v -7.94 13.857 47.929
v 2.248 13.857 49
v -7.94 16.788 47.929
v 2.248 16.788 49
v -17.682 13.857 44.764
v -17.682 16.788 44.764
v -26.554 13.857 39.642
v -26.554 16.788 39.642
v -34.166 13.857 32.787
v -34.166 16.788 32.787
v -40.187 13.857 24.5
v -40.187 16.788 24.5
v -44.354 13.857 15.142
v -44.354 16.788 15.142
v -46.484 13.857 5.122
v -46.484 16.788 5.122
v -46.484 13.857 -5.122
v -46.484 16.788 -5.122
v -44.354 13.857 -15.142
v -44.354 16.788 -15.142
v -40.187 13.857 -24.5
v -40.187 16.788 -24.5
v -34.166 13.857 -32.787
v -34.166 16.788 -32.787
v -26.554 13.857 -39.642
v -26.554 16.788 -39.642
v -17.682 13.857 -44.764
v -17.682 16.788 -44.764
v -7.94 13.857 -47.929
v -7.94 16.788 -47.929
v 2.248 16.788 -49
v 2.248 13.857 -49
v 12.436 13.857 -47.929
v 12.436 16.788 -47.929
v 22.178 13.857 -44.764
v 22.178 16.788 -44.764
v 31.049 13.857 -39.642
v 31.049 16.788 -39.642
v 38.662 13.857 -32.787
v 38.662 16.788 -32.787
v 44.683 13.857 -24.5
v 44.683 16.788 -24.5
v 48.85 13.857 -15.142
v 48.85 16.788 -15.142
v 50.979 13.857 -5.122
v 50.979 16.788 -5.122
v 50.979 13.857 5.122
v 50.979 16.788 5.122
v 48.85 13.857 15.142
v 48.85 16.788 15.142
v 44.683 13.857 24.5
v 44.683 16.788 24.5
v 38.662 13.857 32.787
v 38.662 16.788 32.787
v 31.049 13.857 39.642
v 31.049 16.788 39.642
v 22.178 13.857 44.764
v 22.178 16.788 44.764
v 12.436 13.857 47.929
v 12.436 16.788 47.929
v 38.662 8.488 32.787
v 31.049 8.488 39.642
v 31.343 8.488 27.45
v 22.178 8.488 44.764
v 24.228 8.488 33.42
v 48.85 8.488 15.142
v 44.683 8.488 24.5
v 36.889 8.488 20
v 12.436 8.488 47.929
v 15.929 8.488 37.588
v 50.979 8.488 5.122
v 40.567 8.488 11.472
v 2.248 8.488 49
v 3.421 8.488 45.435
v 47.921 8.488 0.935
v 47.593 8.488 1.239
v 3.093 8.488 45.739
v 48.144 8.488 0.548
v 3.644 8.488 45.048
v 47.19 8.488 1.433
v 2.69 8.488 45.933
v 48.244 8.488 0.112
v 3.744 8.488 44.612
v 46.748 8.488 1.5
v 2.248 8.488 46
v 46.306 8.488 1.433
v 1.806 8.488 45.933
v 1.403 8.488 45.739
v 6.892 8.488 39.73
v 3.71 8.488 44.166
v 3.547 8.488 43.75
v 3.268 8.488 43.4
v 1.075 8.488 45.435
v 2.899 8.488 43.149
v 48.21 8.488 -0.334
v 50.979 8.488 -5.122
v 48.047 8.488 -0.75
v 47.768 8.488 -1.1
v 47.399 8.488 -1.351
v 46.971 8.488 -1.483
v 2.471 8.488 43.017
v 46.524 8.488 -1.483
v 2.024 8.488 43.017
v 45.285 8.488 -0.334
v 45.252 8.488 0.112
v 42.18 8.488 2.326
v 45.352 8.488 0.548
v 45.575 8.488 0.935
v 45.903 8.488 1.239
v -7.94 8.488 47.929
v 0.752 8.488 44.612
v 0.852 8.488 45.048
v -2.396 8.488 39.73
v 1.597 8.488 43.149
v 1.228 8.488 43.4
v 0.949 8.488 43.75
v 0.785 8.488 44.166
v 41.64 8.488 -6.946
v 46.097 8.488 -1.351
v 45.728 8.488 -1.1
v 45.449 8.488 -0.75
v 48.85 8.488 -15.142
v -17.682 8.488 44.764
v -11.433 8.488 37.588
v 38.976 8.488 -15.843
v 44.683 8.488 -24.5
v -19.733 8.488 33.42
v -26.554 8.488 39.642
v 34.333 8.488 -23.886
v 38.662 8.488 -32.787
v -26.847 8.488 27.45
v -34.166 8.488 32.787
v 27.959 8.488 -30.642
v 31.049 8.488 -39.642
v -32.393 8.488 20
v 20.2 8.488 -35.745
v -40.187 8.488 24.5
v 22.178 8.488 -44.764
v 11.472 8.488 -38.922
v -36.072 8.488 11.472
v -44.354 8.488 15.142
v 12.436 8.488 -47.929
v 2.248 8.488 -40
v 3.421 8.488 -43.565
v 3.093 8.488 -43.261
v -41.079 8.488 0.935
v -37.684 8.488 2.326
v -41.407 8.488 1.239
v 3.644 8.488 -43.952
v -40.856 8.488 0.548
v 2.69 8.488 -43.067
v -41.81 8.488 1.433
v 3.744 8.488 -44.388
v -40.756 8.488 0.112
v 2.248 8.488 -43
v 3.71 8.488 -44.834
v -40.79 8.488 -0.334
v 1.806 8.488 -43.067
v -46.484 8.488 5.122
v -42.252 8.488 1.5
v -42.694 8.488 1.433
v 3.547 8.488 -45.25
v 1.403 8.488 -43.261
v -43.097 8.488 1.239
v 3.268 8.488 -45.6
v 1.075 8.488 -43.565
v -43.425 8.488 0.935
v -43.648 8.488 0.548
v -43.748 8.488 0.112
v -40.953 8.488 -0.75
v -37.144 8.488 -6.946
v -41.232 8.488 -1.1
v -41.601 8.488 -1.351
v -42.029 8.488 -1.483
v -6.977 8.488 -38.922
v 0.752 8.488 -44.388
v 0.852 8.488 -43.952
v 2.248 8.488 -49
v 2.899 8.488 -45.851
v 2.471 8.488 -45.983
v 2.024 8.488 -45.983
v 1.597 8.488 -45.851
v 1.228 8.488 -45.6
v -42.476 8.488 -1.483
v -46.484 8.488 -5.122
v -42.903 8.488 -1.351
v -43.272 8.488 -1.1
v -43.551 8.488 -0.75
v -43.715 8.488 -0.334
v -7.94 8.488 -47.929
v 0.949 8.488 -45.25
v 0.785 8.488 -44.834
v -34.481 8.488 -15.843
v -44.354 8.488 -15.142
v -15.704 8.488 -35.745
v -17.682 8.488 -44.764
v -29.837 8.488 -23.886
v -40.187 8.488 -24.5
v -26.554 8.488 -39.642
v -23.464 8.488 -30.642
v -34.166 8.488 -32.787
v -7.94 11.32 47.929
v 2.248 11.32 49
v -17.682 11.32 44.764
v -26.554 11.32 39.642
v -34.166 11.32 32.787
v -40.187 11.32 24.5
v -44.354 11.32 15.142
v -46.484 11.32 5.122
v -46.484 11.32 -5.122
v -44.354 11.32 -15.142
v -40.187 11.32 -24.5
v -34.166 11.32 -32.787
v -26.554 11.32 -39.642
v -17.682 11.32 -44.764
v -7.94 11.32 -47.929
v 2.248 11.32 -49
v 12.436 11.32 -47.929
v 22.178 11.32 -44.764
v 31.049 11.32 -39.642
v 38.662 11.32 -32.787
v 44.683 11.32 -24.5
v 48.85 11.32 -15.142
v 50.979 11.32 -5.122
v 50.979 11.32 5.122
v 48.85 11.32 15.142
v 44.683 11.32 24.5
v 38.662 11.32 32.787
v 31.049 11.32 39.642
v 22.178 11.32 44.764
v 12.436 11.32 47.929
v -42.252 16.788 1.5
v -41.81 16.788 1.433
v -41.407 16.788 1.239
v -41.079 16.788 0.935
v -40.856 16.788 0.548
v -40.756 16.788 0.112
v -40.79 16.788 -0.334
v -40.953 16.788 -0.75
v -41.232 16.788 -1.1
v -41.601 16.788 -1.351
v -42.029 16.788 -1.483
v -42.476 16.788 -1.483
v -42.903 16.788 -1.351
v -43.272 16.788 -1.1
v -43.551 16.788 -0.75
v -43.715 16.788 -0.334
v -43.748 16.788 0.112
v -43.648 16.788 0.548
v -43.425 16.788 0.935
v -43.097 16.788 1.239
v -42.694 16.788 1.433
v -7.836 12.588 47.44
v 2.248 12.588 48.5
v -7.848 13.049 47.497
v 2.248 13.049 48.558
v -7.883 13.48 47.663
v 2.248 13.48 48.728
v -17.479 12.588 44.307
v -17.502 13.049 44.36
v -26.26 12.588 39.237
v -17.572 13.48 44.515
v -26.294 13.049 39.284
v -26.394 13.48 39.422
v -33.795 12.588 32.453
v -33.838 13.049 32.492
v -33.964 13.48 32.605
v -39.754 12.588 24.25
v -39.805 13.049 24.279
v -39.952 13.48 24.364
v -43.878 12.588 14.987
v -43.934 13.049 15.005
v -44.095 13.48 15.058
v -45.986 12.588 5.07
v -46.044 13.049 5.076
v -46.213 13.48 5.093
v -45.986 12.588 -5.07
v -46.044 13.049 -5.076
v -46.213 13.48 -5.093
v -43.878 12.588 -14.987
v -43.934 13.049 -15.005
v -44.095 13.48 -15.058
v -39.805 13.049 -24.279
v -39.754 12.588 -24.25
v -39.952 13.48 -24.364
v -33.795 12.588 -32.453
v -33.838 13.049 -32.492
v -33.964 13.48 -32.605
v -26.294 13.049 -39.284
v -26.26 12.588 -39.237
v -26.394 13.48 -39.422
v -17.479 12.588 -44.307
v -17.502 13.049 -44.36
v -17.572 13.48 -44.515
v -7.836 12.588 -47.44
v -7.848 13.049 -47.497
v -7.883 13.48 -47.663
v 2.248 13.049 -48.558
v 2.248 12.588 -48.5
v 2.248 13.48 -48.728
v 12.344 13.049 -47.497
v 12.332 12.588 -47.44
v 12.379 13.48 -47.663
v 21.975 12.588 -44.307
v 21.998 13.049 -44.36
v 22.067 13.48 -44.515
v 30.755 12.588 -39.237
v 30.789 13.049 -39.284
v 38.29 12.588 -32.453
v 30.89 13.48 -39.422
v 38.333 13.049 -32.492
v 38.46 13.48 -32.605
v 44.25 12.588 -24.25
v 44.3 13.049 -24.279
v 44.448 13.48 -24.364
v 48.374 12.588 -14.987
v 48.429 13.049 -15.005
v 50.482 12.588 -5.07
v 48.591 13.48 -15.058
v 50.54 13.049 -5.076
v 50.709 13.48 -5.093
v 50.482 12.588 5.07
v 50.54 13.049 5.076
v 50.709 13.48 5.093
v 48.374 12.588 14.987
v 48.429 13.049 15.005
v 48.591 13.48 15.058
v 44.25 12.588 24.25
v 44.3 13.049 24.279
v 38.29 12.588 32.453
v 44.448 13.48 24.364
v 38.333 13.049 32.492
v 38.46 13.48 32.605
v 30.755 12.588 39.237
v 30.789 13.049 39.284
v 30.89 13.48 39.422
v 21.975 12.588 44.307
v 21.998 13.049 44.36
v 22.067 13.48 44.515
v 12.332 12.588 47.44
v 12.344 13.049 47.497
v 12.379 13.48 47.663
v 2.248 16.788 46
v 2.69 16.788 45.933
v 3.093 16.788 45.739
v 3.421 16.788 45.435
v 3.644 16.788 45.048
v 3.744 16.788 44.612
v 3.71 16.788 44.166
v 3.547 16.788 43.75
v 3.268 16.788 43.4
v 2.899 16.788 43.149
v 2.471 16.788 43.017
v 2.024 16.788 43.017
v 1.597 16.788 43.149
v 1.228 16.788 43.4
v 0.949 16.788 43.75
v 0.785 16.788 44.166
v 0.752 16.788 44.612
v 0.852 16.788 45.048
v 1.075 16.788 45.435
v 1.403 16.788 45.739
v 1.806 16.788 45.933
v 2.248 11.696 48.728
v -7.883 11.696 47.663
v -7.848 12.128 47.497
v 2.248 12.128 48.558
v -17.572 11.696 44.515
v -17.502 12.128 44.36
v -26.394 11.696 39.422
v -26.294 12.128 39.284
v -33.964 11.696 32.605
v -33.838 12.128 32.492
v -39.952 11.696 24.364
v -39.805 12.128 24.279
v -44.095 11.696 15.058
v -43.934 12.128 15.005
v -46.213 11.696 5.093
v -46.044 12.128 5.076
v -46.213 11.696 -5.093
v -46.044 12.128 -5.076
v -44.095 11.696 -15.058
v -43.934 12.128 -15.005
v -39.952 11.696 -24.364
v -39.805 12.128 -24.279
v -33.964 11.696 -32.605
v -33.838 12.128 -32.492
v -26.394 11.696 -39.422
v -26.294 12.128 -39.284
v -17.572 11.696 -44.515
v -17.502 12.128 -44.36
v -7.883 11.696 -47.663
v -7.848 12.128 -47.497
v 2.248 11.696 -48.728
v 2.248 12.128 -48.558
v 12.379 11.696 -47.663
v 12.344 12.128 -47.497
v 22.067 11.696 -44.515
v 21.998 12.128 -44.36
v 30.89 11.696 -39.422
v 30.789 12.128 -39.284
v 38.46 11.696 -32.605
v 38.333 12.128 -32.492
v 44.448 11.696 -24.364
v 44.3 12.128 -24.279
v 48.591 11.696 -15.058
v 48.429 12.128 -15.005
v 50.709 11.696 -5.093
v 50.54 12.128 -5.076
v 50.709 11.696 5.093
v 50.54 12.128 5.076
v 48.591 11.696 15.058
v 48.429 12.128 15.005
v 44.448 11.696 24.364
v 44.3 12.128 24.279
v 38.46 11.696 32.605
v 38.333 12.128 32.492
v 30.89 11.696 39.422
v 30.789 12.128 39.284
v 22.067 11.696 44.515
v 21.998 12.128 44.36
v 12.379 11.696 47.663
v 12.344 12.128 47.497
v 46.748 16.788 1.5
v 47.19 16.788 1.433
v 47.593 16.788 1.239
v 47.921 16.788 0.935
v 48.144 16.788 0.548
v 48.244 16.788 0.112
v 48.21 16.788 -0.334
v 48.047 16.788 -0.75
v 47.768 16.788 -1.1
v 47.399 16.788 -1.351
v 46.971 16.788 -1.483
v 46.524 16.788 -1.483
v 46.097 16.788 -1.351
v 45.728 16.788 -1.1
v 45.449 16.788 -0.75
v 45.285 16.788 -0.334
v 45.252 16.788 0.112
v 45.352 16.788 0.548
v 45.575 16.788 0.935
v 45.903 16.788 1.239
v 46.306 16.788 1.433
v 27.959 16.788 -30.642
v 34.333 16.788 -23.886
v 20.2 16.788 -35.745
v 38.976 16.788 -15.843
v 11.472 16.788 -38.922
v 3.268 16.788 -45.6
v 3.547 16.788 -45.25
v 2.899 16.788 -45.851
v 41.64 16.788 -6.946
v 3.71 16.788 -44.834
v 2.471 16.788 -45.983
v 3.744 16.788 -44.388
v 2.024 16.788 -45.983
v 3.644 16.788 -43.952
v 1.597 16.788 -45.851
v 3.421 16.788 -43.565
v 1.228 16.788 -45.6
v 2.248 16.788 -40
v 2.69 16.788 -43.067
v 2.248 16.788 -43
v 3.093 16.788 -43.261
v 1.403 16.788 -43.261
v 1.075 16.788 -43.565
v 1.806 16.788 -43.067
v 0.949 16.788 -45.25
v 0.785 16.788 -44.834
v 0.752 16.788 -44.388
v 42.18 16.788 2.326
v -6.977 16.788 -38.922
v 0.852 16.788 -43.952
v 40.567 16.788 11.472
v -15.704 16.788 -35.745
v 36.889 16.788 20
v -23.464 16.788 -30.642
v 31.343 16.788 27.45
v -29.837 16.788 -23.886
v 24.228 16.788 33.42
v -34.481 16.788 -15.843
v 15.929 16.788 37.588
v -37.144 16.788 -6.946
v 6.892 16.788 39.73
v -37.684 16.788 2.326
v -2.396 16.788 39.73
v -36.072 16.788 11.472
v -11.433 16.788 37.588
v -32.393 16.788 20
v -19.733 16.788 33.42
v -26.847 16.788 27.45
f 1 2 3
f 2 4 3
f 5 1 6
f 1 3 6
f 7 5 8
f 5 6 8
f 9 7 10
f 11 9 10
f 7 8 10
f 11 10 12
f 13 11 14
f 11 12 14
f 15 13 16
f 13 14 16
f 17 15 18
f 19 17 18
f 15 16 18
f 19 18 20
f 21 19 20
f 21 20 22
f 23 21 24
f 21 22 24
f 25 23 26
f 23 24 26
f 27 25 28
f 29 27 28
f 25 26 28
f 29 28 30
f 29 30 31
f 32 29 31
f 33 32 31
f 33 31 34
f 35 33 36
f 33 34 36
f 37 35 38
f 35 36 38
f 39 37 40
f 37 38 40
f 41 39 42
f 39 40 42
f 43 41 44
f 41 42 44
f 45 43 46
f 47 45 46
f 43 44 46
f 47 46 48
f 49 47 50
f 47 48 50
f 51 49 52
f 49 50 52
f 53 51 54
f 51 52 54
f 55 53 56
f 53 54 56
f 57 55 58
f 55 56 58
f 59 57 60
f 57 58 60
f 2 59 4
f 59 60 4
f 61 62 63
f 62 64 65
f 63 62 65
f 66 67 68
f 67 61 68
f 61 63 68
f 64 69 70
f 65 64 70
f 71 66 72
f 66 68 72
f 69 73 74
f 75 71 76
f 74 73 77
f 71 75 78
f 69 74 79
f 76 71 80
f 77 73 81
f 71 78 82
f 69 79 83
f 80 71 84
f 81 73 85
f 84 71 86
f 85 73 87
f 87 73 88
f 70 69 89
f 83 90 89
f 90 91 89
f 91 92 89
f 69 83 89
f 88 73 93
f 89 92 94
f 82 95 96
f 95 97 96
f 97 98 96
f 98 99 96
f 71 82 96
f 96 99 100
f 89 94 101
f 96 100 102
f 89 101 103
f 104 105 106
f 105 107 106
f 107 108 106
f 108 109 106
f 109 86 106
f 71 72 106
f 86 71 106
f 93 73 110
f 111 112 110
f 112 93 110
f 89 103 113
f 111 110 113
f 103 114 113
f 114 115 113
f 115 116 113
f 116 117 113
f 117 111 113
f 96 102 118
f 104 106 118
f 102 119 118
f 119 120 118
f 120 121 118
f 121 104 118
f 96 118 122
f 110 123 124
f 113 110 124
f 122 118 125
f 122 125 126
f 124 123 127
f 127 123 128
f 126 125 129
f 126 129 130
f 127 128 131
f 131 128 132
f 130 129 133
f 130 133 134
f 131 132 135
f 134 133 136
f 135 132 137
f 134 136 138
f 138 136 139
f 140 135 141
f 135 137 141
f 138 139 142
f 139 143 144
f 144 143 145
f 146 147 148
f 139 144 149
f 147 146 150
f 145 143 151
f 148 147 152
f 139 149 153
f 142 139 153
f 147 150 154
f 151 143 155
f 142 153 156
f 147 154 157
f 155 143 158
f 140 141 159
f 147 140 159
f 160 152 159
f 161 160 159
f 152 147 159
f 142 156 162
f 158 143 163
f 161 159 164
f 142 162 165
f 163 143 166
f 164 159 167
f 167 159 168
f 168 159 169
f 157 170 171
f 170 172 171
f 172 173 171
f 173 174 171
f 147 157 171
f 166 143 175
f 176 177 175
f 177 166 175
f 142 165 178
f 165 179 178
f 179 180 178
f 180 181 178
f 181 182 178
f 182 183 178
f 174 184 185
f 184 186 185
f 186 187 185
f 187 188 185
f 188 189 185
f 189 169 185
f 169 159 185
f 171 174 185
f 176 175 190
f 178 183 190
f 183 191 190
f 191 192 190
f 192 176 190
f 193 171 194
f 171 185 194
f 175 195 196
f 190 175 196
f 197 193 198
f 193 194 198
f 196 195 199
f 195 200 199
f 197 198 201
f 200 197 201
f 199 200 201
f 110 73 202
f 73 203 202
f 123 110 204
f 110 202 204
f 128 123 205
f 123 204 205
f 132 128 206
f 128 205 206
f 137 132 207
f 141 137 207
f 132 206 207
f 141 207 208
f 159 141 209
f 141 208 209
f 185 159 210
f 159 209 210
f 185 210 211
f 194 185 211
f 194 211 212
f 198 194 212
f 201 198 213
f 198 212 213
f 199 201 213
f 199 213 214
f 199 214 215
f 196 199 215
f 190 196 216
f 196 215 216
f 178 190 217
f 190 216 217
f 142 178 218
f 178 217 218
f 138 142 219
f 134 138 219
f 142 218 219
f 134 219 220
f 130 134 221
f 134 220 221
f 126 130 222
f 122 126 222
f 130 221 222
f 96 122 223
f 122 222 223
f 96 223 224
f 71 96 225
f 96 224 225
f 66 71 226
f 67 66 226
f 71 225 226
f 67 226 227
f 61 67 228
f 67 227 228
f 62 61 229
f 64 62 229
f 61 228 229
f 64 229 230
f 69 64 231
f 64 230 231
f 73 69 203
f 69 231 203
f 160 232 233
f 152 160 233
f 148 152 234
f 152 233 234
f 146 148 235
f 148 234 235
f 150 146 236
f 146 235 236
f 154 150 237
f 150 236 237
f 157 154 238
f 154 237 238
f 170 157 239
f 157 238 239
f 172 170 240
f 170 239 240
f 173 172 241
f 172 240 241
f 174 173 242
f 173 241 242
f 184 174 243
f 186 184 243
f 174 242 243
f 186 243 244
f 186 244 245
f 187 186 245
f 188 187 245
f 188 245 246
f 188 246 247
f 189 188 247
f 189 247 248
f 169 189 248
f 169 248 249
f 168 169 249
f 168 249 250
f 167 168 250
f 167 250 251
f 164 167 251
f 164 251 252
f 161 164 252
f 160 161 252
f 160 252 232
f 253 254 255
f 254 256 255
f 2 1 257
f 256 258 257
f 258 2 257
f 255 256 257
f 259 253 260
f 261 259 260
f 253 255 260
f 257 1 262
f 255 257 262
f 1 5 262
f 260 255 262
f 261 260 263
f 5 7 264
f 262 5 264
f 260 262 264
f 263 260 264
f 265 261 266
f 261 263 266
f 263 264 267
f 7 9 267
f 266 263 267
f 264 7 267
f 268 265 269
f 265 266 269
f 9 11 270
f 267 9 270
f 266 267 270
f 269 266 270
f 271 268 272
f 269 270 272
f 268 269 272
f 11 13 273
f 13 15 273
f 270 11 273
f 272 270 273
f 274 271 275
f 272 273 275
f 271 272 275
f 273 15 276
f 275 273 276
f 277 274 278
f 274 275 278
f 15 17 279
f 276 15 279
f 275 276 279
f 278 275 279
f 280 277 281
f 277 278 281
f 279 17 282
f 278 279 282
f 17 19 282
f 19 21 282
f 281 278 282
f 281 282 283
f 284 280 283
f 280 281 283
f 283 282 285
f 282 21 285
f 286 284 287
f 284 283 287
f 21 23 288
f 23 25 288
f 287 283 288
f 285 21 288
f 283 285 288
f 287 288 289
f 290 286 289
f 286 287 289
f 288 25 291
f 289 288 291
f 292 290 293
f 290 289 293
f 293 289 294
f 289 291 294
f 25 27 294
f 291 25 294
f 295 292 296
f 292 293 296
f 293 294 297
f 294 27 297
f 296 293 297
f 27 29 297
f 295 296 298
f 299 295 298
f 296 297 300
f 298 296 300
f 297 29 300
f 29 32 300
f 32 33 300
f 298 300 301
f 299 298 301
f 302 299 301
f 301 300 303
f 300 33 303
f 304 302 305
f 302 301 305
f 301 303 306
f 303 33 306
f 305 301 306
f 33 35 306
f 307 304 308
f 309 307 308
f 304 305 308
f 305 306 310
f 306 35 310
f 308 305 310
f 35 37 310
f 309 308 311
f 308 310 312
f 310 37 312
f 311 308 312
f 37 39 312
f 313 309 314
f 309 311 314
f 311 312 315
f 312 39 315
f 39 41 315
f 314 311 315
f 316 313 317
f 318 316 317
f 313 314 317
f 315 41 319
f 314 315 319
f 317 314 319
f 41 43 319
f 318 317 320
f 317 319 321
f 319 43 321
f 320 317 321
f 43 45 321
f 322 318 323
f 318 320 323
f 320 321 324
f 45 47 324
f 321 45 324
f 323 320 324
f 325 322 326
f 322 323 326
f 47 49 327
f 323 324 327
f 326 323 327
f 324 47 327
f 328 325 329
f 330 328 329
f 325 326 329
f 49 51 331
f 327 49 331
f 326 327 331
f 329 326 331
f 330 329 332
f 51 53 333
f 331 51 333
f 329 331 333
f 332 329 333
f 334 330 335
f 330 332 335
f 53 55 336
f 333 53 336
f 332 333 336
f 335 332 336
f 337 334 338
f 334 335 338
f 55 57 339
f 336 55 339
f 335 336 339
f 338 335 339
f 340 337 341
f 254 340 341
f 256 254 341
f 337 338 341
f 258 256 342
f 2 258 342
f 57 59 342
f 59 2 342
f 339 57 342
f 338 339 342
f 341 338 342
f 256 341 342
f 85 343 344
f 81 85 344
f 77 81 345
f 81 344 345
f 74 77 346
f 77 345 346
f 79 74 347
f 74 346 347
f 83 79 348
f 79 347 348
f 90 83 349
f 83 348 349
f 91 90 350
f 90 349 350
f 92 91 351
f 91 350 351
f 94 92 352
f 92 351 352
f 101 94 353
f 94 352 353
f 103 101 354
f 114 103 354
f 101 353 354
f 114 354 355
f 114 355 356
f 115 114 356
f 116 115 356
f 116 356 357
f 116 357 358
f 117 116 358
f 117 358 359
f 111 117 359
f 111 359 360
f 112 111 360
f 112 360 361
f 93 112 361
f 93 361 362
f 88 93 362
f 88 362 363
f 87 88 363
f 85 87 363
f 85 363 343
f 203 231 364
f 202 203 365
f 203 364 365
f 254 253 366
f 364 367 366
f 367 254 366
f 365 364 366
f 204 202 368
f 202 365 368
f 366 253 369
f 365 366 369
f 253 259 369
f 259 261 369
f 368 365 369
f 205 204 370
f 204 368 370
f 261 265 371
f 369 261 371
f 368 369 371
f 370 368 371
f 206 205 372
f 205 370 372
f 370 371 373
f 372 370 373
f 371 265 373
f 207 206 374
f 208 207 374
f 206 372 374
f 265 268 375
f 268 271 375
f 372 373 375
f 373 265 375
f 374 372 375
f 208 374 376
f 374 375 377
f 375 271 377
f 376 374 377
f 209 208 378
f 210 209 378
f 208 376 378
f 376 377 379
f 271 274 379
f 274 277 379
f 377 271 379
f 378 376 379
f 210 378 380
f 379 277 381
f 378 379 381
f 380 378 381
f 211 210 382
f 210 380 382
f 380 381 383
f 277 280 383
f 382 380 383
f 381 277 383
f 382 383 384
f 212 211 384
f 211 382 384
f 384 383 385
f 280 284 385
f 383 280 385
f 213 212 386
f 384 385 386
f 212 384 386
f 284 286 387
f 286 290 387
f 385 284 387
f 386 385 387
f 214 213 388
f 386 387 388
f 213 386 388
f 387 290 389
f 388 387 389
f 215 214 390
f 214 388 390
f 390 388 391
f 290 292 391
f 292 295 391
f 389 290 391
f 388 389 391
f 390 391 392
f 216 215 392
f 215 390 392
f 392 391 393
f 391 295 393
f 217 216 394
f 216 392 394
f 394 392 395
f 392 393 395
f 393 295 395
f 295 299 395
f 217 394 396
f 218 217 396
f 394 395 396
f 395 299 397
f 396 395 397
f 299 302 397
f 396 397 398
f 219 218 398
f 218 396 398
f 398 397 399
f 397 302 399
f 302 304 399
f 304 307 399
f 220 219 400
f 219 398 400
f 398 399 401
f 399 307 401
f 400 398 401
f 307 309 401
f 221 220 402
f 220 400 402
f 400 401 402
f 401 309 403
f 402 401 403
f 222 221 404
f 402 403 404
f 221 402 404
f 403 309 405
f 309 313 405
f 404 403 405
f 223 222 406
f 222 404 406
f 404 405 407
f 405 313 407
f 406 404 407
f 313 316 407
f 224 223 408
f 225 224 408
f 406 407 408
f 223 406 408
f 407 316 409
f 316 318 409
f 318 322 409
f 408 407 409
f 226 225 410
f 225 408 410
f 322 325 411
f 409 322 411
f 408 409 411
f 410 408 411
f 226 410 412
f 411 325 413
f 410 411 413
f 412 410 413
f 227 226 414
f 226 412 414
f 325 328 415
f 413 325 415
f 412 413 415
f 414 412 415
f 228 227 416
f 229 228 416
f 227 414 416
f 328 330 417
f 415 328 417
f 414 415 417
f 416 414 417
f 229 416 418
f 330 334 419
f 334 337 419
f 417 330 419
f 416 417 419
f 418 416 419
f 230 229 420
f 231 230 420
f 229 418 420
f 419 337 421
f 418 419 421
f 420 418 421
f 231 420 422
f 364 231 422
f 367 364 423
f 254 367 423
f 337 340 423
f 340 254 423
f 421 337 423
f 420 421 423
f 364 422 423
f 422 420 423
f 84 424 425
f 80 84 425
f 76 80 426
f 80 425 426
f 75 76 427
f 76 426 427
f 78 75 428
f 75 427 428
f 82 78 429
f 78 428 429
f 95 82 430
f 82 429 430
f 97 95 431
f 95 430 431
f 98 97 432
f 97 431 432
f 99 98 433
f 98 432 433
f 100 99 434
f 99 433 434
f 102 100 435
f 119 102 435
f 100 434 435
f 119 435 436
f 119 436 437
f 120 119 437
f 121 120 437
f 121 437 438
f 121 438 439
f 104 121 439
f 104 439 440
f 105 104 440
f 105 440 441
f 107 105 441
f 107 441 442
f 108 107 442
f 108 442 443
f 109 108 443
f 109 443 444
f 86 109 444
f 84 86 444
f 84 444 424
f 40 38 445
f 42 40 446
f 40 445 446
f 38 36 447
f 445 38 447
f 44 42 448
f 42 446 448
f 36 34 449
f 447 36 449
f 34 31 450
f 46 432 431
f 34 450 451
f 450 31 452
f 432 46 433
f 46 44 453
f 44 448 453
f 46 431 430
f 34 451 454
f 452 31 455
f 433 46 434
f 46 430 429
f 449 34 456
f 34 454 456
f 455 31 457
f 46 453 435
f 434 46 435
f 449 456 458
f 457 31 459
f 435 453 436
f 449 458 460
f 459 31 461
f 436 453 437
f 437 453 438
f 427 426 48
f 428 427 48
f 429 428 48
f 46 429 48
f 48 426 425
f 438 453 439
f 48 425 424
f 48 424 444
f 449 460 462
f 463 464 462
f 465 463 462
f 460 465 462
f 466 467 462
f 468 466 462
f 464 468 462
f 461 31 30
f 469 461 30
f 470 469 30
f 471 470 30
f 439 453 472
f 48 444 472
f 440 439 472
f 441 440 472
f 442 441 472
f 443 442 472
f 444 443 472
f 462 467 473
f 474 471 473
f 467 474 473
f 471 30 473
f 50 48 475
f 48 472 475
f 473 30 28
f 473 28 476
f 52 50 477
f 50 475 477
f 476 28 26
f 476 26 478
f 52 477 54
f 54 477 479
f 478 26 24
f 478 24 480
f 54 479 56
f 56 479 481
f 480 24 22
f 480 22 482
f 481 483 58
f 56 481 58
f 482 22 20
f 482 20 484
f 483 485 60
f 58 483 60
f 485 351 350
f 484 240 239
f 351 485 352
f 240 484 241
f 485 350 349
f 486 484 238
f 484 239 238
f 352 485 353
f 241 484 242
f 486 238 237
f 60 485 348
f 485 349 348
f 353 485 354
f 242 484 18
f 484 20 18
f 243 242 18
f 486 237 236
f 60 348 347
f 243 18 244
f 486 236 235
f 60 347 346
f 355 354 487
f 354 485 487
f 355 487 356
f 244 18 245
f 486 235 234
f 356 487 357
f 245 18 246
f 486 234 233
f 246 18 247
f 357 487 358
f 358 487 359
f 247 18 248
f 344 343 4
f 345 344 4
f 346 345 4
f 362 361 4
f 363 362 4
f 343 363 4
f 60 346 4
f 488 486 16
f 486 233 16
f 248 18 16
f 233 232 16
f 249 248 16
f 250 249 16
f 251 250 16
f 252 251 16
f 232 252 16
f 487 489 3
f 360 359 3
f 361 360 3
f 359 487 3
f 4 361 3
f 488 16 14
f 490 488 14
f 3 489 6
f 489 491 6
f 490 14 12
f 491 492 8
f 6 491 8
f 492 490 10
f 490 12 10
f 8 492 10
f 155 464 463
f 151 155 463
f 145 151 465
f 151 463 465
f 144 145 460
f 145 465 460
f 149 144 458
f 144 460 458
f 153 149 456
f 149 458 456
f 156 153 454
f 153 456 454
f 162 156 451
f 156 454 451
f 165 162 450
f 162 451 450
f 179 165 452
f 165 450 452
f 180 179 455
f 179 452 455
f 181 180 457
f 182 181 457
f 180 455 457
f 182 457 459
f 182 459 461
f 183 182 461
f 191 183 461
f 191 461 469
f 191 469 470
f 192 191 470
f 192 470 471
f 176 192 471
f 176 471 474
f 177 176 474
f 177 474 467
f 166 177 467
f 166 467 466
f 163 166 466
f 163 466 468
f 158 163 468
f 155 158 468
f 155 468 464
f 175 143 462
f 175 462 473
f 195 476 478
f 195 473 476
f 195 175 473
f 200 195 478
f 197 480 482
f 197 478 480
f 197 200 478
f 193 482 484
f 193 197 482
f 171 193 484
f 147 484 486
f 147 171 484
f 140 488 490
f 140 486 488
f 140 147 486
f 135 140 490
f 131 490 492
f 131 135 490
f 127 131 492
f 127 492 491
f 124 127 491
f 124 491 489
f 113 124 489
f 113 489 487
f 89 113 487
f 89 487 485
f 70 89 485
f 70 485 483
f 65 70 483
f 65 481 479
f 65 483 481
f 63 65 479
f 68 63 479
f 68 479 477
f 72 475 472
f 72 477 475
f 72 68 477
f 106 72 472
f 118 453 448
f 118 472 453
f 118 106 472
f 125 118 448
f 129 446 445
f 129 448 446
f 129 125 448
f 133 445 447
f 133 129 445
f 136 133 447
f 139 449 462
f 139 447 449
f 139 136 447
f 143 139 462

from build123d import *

# Parameters (mm, degrees)
SKETCH_7_R          = 40
CUT_EXTRUDE_1_DEPTH = 73.864118401
SKETCH_8_R          = 1.5
CUT_EXTRUDE_2_DEPTH = 10


with BuildPart() as part:
    # 草图5 → 旋转2 (revolve)
    with BuildSketch(Plane.XY, mode=Mode.PRIVATE) as revolve_2_sk:
        with BuildLine():
            Line((-46.752169664, 16.788080184), (2.247830336, 16.788080184))
            Line((2.247830336, 16.788080184), (2.247830336, 8.488080184))
            Line((2.247830336, 8.488080184), (-46.752169664, 8.488080184))
            Line((-46.752169664, 8.488080184), (-46.752169664, 11.319510864))
            ThreePointArc((-46.752169664, 11.319510864), (-46.381680312, 11.906305273), (-46.252169664, 12.588080184))
            ThreePointArc((-46.252169664, 12.588080184), (-46.381680312, 13.269855096), (-46.752169664, 13.856649505))
            Line((-46.752169664, 13.856649505), (-46.752169664, 16.788080184))
        make_face()
    revolve(revolve_2_sk.sketch.rotate(Axis((2.247830336, 16.788080184, 0), (0, -1, 0)), 270), axis=Axis((2.247830336, 16.788080184, 0), (0, -1, 0)))

    # 草图7 → 切除-拉伸1 (cut, through all)
    with BuildSketch(Plane(origin=(0, 0, 0), x_dir=(1, 0, 0), z_dir=(0, 1, 0))):
        with Locations(Location((2.247830336, 0, 0), (0, 0, 90))):
            Circle(SKETCH_7_R)
    extrude(amount=CUT_EXTRUDE_1_DEPTH, mode=Mode.SUBTRACT)

    # 草图8 → 切除-拉伸2 (cut)
    with BuildSketch(Plane(origin=(0, 16.788080184, 0), x_dir=(1, 0, 0), z_dir=(0, 1, 0))):
        with Locations(Location((2.247830336, 44.5, 0), (0, 0, 270))):
            Circle(SKETCH_8_R)
        with Locations(Location((46.747830336, 0, 0), (0, 0, 270))):
            Circle(SKETCH_8_R)
        with Locations(Location((2.247830336, -44.5, 0), (0, 0, 270))):
            Circle(SKETCH_8_R)
        with Locations(Location((-42.252169664, 0, 0), (0, 0, 270))):
            Circle(SKETCH_8_R)
    extrude(amount=-CUT_EXTRUDE_2_DEPTH, mode=Mode.SUBTRACT)


solid = part.part
